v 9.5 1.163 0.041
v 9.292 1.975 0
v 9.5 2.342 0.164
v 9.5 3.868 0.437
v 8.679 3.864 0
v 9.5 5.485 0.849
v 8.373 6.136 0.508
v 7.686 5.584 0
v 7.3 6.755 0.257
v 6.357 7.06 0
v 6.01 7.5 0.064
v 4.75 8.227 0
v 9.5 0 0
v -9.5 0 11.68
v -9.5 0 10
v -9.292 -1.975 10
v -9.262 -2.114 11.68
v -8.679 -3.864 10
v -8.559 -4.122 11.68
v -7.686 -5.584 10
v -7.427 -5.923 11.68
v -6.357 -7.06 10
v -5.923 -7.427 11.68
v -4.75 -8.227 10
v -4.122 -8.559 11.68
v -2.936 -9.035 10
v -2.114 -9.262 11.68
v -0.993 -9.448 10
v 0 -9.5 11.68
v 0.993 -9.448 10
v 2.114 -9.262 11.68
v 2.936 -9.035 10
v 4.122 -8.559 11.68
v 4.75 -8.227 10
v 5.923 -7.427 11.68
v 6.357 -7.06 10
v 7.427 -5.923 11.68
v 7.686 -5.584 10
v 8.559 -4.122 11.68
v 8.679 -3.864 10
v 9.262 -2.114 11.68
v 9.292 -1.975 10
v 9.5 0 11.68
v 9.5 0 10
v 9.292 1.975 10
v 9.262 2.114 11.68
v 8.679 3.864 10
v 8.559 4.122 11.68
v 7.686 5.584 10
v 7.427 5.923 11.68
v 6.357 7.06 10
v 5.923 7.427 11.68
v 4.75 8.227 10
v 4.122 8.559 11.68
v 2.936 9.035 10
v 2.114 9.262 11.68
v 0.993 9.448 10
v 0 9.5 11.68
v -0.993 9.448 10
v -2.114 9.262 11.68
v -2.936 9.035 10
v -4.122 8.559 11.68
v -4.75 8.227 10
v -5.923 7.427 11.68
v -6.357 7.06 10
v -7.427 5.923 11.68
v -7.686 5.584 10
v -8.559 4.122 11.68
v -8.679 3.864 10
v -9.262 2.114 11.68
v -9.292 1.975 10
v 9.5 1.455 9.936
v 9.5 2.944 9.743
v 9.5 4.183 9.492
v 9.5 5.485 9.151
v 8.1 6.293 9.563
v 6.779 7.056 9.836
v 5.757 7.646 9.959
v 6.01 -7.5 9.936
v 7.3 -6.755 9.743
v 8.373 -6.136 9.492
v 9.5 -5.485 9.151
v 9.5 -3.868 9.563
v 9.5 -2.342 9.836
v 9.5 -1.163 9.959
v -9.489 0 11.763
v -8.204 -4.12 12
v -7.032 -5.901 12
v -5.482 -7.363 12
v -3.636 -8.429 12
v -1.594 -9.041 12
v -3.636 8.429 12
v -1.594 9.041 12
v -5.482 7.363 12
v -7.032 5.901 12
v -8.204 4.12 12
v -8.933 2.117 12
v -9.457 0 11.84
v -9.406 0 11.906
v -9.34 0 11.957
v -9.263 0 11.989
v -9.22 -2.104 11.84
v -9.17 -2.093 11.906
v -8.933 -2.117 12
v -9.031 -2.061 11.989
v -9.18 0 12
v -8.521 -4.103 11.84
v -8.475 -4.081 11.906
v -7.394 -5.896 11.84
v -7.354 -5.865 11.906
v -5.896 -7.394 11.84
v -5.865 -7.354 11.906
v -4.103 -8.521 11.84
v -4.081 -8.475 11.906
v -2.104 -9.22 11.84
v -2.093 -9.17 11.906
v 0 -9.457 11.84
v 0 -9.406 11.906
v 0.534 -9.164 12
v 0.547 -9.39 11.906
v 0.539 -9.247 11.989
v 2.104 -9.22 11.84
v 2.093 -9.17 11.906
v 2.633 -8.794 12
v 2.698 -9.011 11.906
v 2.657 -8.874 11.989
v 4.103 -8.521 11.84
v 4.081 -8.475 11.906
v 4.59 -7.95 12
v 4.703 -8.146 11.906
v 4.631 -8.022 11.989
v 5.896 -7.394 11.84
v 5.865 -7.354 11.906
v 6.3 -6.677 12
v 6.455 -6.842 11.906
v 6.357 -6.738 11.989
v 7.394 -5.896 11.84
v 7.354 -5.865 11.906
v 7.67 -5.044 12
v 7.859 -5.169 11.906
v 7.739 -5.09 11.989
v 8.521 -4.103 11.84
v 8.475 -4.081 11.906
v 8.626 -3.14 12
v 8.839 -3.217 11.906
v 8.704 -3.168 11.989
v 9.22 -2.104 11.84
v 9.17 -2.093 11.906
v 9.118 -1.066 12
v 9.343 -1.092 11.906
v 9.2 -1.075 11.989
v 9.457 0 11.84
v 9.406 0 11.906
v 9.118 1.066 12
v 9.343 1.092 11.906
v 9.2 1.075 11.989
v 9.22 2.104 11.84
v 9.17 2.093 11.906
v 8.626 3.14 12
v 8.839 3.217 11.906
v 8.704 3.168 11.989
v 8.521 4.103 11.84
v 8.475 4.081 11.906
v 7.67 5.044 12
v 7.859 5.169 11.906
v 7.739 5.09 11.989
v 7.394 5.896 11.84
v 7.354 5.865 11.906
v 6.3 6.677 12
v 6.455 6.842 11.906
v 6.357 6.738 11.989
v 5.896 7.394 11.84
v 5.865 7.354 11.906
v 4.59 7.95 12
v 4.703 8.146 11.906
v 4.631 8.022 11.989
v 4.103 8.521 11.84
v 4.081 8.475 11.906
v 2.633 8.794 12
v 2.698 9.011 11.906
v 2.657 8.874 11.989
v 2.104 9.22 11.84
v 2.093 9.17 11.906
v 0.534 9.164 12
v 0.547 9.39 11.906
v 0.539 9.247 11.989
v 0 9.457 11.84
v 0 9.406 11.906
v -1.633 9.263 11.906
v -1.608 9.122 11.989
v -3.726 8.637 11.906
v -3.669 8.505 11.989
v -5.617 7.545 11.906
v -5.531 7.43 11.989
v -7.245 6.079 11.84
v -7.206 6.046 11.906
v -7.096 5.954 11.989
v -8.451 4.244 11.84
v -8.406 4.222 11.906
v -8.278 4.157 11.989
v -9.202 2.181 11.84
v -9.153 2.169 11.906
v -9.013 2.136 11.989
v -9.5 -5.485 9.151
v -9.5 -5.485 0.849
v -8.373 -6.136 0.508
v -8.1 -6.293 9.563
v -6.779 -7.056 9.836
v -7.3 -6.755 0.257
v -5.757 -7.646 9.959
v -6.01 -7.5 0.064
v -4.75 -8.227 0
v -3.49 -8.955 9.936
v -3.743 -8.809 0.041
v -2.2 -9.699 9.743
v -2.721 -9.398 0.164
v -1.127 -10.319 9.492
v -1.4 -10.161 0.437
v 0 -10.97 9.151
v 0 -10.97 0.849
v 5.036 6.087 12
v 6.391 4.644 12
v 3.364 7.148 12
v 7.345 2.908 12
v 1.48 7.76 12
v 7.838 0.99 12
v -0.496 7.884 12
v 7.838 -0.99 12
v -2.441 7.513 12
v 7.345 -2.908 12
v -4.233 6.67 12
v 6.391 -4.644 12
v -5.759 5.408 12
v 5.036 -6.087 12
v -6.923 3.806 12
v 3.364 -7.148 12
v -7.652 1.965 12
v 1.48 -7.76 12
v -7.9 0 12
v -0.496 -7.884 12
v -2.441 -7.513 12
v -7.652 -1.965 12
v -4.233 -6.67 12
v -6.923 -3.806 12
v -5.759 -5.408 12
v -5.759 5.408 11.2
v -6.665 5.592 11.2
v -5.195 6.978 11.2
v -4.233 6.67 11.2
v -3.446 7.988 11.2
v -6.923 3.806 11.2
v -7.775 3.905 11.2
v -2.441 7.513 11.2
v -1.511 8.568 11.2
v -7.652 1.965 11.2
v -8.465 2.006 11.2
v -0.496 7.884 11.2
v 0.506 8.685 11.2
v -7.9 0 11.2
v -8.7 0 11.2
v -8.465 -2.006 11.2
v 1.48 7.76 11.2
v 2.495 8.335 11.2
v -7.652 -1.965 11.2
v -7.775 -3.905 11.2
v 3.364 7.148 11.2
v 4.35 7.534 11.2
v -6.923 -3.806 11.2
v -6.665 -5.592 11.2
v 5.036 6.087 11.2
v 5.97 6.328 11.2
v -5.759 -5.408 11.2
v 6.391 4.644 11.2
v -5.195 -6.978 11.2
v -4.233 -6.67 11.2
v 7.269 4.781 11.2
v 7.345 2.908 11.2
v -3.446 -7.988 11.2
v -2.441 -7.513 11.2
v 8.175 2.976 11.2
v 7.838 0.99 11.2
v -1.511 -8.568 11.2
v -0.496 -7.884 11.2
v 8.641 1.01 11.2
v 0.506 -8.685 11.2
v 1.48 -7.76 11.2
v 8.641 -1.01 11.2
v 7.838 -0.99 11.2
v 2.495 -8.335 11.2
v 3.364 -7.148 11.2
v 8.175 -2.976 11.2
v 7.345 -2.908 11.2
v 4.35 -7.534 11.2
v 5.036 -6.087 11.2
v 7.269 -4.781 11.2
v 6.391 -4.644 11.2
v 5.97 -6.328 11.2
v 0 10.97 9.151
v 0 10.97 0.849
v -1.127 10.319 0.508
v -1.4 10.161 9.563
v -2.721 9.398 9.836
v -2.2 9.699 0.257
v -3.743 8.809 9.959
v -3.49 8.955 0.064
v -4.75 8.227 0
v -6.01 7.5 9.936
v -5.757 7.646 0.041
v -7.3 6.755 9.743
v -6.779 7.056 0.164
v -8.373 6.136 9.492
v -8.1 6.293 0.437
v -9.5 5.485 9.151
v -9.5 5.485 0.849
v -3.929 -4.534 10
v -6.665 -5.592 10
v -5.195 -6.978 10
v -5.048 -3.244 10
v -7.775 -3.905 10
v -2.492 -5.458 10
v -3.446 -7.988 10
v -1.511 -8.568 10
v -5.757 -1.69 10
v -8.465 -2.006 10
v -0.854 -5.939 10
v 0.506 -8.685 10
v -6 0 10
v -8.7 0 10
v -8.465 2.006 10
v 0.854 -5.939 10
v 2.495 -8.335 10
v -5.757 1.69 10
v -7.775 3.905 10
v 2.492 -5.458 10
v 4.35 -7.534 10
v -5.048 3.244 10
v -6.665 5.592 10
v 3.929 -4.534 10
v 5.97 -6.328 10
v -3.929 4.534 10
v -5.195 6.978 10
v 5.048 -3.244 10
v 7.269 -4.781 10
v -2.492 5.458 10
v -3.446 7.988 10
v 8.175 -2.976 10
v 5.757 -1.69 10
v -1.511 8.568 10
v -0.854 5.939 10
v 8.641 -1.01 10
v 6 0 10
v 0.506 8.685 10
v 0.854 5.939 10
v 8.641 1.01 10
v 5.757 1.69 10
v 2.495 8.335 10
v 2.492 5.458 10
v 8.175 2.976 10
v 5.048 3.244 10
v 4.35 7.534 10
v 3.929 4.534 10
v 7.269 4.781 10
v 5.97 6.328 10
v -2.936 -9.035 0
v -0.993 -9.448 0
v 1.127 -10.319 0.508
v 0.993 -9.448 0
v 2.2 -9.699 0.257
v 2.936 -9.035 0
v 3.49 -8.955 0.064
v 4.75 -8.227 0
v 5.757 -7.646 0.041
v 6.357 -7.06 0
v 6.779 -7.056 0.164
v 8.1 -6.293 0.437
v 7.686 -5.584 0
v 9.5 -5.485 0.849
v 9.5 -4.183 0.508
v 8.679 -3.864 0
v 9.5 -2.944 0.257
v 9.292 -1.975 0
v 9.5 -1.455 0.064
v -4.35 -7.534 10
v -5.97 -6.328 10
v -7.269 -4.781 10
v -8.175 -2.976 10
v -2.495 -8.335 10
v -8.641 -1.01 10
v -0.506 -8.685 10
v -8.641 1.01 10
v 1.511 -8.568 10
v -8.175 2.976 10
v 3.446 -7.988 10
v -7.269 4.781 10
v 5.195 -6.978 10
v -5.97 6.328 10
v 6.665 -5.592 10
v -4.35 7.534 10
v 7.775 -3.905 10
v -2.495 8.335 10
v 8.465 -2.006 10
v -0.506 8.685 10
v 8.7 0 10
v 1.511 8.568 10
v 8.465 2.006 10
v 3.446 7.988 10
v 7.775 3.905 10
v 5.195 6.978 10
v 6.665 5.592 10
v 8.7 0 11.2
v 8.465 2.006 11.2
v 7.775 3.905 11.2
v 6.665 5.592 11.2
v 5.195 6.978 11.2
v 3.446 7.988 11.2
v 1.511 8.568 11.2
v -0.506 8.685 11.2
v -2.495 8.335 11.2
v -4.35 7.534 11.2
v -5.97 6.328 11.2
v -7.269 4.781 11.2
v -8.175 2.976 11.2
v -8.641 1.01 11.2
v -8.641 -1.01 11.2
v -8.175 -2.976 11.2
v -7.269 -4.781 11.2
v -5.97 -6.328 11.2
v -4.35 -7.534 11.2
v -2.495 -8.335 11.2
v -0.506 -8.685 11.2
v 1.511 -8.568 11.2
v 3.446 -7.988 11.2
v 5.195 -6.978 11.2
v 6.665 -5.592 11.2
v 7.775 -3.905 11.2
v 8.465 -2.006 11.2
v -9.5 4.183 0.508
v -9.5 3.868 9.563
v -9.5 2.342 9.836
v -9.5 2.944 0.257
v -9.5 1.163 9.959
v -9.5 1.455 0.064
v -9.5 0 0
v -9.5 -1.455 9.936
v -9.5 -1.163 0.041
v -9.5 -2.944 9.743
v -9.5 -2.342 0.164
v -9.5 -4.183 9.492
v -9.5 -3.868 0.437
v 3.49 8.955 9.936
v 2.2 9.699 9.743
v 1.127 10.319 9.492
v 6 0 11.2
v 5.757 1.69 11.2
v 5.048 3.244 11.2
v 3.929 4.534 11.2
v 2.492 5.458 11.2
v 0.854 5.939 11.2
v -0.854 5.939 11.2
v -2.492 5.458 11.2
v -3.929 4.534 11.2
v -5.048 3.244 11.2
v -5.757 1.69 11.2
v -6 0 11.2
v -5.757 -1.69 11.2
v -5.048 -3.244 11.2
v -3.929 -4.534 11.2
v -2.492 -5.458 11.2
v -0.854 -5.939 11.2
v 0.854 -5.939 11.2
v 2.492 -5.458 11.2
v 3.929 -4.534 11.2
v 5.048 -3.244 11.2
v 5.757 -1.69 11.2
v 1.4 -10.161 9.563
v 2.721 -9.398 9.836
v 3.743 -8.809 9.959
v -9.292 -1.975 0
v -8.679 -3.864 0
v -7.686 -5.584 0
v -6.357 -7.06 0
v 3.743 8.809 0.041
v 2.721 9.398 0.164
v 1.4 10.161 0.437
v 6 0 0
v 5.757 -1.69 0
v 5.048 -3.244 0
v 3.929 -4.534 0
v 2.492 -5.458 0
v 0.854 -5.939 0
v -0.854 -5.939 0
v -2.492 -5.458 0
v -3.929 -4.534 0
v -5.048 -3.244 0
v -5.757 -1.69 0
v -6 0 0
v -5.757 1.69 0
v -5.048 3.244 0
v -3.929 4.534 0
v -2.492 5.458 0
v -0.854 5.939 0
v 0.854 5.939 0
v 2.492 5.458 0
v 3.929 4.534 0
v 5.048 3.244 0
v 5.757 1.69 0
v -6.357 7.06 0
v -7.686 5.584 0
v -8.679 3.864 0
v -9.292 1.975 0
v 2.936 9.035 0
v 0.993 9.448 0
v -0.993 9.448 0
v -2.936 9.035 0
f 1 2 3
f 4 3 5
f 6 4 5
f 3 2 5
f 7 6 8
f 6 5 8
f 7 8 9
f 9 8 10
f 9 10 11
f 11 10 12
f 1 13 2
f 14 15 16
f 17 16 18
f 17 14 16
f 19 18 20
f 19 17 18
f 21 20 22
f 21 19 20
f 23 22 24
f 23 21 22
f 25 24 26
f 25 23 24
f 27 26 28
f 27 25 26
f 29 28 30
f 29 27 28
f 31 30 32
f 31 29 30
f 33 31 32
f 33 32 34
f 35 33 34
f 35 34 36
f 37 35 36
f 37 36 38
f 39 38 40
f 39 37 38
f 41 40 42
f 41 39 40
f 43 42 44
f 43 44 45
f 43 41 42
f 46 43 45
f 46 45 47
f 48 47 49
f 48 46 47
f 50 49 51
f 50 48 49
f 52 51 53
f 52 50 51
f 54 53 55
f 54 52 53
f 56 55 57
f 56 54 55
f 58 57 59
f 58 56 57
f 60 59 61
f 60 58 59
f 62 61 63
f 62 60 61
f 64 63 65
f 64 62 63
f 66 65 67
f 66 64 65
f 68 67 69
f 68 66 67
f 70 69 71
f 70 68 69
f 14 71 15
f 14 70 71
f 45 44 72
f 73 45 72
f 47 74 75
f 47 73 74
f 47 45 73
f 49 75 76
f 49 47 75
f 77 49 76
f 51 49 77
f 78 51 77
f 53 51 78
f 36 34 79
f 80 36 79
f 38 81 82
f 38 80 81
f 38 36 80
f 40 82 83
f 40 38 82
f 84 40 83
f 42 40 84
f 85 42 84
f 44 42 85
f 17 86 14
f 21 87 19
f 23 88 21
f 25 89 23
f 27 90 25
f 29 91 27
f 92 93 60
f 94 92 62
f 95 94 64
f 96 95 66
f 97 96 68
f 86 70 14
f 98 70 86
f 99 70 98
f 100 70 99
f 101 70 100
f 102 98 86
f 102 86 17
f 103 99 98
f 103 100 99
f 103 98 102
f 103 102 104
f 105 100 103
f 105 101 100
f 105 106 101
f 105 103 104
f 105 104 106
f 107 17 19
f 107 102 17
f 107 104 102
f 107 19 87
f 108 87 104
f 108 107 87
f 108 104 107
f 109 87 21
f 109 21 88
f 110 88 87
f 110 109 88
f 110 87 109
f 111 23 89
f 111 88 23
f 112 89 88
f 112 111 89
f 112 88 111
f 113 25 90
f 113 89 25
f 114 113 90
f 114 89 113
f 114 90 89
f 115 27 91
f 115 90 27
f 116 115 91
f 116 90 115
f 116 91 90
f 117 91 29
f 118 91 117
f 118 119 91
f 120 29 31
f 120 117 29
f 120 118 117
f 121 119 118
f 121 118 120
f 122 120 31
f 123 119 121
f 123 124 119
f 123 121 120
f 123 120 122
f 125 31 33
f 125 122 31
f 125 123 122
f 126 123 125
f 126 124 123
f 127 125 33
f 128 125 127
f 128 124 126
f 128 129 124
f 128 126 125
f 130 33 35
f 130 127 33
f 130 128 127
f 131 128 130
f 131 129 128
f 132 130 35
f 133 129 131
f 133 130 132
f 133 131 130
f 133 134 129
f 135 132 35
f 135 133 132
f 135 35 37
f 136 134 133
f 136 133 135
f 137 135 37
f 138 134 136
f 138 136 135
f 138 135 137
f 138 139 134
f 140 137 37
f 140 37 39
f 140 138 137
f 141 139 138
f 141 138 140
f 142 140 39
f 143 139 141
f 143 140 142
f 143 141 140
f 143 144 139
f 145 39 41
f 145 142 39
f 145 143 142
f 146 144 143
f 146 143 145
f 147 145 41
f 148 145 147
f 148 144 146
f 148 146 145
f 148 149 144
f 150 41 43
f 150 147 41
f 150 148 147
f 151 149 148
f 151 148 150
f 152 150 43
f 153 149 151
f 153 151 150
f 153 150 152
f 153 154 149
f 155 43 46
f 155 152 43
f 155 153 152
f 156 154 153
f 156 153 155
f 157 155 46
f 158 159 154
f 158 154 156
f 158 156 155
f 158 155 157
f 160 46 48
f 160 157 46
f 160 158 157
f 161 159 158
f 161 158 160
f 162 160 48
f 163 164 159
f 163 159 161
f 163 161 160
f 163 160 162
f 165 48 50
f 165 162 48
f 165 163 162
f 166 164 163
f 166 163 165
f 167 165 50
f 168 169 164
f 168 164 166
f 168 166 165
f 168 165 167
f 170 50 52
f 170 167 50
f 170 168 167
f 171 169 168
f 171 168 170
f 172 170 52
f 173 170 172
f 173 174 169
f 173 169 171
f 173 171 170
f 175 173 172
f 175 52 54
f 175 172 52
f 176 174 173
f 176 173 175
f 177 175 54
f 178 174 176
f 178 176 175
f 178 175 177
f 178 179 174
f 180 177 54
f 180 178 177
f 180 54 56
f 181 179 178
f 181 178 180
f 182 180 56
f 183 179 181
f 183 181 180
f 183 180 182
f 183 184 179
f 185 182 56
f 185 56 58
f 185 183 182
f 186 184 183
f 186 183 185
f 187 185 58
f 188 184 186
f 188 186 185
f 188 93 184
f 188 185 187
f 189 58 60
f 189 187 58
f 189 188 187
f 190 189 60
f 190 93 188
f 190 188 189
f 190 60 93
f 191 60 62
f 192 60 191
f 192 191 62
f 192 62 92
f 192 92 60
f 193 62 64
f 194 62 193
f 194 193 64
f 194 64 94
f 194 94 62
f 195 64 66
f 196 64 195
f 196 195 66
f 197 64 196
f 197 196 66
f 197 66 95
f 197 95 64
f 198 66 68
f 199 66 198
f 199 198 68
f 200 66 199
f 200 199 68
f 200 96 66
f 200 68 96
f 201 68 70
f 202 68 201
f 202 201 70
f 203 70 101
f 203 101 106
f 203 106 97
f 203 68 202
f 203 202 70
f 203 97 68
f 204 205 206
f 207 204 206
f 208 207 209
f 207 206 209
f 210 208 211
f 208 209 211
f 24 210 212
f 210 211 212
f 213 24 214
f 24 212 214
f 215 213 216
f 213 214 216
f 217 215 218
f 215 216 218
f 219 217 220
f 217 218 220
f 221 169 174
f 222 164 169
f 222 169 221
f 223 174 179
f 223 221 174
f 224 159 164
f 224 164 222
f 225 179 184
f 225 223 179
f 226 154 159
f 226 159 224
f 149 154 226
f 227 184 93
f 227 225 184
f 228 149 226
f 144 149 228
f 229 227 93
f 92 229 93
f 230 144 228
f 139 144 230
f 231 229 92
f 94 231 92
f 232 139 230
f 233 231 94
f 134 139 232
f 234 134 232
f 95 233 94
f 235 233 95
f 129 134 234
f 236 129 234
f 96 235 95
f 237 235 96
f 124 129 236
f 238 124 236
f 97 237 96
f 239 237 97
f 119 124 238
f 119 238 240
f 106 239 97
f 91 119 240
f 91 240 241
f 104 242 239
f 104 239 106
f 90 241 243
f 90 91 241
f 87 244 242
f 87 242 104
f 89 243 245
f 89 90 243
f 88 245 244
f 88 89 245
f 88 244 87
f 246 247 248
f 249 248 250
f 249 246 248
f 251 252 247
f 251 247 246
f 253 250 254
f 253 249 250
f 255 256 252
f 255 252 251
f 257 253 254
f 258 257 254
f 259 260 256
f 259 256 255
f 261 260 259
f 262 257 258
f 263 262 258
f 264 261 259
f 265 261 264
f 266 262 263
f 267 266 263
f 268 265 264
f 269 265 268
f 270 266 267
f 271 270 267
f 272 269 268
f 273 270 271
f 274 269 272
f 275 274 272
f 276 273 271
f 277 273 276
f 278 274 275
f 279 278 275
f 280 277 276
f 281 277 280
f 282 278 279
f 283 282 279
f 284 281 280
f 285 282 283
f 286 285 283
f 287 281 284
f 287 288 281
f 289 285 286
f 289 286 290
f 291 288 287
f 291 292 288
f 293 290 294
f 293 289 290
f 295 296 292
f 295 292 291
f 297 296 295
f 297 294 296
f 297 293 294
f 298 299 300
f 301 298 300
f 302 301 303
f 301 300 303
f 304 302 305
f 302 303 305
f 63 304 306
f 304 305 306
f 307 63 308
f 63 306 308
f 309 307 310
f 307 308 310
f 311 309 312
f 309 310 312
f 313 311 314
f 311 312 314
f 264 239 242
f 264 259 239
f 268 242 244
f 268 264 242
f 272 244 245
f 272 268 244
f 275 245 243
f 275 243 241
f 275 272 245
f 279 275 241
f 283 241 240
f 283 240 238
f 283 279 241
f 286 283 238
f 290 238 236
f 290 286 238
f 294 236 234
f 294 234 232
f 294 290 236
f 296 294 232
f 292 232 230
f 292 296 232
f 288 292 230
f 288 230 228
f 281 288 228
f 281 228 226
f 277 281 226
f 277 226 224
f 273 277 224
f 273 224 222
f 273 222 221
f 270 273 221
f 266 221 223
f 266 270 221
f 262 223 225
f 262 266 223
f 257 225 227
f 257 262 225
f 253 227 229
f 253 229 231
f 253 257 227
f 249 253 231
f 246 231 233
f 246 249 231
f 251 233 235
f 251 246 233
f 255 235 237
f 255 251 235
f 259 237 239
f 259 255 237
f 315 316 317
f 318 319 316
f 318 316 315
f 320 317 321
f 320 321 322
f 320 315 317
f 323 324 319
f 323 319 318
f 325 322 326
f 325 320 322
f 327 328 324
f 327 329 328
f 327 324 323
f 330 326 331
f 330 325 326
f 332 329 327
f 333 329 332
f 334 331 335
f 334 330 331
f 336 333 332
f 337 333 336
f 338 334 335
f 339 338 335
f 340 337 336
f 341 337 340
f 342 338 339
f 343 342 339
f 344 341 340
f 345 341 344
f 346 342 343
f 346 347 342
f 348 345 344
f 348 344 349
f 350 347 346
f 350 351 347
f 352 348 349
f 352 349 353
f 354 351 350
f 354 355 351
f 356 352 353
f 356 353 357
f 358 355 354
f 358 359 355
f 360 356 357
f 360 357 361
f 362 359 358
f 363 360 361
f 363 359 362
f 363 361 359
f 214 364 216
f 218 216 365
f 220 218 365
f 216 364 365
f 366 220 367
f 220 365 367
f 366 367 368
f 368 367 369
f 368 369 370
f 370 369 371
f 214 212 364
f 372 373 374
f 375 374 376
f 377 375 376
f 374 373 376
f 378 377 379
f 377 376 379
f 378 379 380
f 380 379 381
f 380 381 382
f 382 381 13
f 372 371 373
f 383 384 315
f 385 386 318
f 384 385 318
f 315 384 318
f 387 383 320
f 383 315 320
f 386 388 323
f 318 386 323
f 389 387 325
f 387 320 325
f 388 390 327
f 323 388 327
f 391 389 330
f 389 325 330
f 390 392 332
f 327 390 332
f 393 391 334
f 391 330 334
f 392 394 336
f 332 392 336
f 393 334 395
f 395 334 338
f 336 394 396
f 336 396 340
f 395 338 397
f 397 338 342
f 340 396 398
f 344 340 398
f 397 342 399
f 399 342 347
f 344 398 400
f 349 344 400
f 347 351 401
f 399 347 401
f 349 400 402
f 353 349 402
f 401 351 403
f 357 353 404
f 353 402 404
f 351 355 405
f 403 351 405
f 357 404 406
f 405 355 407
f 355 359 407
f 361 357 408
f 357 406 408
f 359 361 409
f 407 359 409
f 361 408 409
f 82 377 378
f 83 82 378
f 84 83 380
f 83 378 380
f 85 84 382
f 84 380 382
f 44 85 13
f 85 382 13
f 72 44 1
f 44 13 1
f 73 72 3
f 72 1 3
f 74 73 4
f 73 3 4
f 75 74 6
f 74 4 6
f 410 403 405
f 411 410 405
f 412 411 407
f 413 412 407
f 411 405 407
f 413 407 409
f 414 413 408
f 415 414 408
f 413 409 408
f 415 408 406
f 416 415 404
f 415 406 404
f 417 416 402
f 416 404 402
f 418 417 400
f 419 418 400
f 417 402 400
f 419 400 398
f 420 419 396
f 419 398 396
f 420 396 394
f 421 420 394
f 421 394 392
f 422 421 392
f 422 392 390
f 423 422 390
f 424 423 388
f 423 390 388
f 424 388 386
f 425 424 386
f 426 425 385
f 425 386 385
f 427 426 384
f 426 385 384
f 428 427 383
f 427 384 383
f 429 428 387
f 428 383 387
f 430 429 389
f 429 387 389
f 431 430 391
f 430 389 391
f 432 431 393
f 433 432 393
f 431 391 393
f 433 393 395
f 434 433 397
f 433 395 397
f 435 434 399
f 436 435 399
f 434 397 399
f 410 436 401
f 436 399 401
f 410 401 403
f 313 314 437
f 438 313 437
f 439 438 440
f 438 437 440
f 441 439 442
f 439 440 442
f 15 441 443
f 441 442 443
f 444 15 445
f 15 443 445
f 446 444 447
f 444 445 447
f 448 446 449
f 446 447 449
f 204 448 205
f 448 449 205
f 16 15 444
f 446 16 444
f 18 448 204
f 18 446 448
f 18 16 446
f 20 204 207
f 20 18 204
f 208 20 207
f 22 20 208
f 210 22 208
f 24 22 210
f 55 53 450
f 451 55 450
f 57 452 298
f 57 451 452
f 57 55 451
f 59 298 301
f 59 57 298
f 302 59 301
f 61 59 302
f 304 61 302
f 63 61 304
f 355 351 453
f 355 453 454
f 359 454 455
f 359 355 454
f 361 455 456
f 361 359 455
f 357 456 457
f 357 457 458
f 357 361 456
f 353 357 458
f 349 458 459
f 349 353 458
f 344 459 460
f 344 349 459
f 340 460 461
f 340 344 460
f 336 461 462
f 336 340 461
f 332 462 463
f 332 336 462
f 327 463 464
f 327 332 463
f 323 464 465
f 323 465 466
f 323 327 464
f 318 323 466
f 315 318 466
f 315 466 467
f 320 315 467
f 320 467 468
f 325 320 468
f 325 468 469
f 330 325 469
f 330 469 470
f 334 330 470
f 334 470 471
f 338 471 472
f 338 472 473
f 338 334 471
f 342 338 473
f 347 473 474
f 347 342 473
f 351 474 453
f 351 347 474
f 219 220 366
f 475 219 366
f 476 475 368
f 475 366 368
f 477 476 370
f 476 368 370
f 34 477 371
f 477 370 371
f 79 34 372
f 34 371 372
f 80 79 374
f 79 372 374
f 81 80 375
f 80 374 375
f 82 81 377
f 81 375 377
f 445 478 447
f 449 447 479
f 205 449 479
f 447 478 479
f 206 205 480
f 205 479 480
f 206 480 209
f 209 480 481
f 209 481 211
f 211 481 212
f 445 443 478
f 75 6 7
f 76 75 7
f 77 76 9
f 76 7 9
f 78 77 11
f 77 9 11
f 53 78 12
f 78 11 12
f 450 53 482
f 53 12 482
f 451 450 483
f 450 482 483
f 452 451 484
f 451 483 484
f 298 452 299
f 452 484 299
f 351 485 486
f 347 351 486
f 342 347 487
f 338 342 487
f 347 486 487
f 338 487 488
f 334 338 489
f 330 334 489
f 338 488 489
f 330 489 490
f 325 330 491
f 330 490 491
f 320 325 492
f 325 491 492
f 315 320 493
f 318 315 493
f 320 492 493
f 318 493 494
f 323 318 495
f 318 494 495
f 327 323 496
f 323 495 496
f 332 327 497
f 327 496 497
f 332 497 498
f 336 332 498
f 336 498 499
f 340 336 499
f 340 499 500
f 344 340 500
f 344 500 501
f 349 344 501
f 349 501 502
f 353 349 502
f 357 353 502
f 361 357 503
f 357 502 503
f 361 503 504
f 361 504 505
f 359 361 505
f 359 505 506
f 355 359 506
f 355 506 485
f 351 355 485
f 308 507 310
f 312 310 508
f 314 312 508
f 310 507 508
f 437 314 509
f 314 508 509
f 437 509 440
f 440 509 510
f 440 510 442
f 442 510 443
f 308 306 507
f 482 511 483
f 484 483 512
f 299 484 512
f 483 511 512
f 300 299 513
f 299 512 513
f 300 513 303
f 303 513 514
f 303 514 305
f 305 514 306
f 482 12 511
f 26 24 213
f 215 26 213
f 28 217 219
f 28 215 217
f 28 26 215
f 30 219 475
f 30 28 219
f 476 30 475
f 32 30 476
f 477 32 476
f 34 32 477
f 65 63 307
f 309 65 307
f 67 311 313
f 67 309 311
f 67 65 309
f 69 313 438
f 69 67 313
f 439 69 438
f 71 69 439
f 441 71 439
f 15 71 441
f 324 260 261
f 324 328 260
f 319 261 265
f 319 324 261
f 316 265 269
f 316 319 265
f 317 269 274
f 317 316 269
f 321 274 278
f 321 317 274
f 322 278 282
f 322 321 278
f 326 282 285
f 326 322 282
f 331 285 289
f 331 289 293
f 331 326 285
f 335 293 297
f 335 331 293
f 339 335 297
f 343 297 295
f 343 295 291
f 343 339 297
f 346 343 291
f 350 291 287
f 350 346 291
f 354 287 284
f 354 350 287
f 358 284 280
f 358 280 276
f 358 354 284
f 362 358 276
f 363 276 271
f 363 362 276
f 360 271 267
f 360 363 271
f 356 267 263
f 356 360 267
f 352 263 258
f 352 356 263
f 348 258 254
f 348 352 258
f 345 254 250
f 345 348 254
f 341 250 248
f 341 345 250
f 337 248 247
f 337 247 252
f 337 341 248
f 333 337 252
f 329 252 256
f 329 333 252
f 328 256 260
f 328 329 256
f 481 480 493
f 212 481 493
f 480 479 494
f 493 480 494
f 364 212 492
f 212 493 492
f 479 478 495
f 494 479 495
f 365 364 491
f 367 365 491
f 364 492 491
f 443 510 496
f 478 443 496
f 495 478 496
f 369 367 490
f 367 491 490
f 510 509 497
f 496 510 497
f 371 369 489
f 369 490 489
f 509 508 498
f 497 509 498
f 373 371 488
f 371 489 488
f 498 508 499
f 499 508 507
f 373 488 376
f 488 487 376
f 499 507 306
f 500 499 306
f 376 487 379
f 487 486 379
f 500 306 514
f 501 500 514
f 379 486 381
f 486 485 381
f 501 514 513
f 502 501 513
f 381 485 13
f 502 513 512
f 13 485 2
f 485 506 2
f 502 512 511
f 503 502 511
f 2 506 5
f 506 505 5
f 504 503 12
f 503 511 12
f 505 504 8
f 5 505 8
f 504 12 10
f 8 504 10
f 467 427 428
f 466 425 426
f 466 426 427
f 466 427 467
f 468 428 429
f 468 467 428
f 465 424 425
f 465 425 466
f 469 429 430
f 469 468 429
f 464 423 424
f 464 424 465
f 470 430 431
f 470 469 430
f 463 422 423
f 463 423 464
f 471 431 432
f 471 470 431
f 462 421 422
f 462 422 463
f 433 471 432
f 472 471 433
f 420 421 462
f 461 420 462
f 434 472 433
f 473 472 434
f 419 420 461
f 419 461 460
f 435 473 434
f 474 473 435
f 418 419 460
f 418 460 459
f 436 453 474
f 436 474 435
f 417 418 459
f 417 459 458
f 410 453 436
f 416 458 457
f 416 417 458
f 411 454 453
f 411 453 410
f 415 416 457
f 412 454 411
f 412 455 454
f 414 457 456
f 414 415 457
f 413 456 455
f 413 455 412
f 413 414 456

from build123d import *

# Parameters (mm, degrees)
EXTRUDE1_DEPTH     = 10
SKETCH5_R          = 8.7
SKETCH5_R_2        = 6
EXTRUDE2_DEPTH     = 1.2
SKETCH4_R          = 6
CUT_EXTRUDE1_DEPTH = 19.83038325
FILLET2_R          = 0.32


with BuildPart() as part:
    # Sketch1 → Extrude1 (new body)
    with BuildSketch(Plane.XY):
        Polygon((0, 10.969655115), (-9.5, 5.484827557), (-9.5, -5.484827557), (0, -10.969655115), (9.5, -5.484827557), (9.5, 5.484827557), align=None)
    extrude(amount=EXTRUDE1_DEPTH)

    # Sketch2 → Cut-Revolve1 (revolve, cut)
    with BuildSketch(Plane(origin=(0, 0, 0), x_dir=(1, 0, 0), z_dir=(0, 1, 0))):
        Polygon((9.5, -10), (13.3, -10), (13.3, -7.806068977), align=None)
    cut_revolve1 = revolve(axis=Axis((0, 0, 0), (0, 0, 1)), mode=Mode.SUBTRACT)

    # Mirror1: Cut-Revolve1 across plane
    add(cut_revolve1.mirror(Plane(origin=(0, 0, 5), x_dir=(1, 0, 0), z_dir=(0, 0, -1))), mode=Mode.SUBTRACT)

    # Sketch3 → Revolve1 (revolve)
    with BuildSketch(Plane(origin=(0, 0, 0), x_dir=(1, 0, 0), z_dir=(0, 1, 0)), mode=Mode.PRIVATE) as revolve1_sk:
        Polygon((9.5, -10), (9.5, -12), (7.9, -12), (7.9, -11.2), (8.7, -11.2), (8.7, -10), align=None)
    revolve(revolve1_sk.sketch.rotate(Axis((0, 0, 0), (0, 0, 1)), 180), axis=Axis((0, 0, 0), (0, 0, 1)))

    # Sketch4 → Cut-Extrude1 (cut, through all)
    with BuildSketch(Plane(origin=(0, 0, 0), x_dir=(-1, 0, 0), z_dir=(0, 0, -1))):
        with Locations(Location((0, 0, 0), (0, 0, 180))):
            Circle(SKETCH4_R)
    extrude(amount=-CUT_EXTRUDE1_DEPTH, mode=Mode.SUBTRACT)

    # Fillet2
    fillet2_edges = [part.edges().sort_by_distance(p)[0] for p in [
        (9.5, 0, 12),
    ]]
    fillet(fillet2_edges, radius=FILLET2_R)


with BuildPart() as body_2:
    # Sketch5 → Extrude2 (new body)
    with BuildSketch(Plane.XY.offset(10)):
        Circle(SKETCH5_R)
        Circle(SKETCH5_R_2, mode=Mode.SUBTRACT)
    extrude(amount=EXTRUDE2_DEPTH)


solid = Compound([part.part, body_2.part])
